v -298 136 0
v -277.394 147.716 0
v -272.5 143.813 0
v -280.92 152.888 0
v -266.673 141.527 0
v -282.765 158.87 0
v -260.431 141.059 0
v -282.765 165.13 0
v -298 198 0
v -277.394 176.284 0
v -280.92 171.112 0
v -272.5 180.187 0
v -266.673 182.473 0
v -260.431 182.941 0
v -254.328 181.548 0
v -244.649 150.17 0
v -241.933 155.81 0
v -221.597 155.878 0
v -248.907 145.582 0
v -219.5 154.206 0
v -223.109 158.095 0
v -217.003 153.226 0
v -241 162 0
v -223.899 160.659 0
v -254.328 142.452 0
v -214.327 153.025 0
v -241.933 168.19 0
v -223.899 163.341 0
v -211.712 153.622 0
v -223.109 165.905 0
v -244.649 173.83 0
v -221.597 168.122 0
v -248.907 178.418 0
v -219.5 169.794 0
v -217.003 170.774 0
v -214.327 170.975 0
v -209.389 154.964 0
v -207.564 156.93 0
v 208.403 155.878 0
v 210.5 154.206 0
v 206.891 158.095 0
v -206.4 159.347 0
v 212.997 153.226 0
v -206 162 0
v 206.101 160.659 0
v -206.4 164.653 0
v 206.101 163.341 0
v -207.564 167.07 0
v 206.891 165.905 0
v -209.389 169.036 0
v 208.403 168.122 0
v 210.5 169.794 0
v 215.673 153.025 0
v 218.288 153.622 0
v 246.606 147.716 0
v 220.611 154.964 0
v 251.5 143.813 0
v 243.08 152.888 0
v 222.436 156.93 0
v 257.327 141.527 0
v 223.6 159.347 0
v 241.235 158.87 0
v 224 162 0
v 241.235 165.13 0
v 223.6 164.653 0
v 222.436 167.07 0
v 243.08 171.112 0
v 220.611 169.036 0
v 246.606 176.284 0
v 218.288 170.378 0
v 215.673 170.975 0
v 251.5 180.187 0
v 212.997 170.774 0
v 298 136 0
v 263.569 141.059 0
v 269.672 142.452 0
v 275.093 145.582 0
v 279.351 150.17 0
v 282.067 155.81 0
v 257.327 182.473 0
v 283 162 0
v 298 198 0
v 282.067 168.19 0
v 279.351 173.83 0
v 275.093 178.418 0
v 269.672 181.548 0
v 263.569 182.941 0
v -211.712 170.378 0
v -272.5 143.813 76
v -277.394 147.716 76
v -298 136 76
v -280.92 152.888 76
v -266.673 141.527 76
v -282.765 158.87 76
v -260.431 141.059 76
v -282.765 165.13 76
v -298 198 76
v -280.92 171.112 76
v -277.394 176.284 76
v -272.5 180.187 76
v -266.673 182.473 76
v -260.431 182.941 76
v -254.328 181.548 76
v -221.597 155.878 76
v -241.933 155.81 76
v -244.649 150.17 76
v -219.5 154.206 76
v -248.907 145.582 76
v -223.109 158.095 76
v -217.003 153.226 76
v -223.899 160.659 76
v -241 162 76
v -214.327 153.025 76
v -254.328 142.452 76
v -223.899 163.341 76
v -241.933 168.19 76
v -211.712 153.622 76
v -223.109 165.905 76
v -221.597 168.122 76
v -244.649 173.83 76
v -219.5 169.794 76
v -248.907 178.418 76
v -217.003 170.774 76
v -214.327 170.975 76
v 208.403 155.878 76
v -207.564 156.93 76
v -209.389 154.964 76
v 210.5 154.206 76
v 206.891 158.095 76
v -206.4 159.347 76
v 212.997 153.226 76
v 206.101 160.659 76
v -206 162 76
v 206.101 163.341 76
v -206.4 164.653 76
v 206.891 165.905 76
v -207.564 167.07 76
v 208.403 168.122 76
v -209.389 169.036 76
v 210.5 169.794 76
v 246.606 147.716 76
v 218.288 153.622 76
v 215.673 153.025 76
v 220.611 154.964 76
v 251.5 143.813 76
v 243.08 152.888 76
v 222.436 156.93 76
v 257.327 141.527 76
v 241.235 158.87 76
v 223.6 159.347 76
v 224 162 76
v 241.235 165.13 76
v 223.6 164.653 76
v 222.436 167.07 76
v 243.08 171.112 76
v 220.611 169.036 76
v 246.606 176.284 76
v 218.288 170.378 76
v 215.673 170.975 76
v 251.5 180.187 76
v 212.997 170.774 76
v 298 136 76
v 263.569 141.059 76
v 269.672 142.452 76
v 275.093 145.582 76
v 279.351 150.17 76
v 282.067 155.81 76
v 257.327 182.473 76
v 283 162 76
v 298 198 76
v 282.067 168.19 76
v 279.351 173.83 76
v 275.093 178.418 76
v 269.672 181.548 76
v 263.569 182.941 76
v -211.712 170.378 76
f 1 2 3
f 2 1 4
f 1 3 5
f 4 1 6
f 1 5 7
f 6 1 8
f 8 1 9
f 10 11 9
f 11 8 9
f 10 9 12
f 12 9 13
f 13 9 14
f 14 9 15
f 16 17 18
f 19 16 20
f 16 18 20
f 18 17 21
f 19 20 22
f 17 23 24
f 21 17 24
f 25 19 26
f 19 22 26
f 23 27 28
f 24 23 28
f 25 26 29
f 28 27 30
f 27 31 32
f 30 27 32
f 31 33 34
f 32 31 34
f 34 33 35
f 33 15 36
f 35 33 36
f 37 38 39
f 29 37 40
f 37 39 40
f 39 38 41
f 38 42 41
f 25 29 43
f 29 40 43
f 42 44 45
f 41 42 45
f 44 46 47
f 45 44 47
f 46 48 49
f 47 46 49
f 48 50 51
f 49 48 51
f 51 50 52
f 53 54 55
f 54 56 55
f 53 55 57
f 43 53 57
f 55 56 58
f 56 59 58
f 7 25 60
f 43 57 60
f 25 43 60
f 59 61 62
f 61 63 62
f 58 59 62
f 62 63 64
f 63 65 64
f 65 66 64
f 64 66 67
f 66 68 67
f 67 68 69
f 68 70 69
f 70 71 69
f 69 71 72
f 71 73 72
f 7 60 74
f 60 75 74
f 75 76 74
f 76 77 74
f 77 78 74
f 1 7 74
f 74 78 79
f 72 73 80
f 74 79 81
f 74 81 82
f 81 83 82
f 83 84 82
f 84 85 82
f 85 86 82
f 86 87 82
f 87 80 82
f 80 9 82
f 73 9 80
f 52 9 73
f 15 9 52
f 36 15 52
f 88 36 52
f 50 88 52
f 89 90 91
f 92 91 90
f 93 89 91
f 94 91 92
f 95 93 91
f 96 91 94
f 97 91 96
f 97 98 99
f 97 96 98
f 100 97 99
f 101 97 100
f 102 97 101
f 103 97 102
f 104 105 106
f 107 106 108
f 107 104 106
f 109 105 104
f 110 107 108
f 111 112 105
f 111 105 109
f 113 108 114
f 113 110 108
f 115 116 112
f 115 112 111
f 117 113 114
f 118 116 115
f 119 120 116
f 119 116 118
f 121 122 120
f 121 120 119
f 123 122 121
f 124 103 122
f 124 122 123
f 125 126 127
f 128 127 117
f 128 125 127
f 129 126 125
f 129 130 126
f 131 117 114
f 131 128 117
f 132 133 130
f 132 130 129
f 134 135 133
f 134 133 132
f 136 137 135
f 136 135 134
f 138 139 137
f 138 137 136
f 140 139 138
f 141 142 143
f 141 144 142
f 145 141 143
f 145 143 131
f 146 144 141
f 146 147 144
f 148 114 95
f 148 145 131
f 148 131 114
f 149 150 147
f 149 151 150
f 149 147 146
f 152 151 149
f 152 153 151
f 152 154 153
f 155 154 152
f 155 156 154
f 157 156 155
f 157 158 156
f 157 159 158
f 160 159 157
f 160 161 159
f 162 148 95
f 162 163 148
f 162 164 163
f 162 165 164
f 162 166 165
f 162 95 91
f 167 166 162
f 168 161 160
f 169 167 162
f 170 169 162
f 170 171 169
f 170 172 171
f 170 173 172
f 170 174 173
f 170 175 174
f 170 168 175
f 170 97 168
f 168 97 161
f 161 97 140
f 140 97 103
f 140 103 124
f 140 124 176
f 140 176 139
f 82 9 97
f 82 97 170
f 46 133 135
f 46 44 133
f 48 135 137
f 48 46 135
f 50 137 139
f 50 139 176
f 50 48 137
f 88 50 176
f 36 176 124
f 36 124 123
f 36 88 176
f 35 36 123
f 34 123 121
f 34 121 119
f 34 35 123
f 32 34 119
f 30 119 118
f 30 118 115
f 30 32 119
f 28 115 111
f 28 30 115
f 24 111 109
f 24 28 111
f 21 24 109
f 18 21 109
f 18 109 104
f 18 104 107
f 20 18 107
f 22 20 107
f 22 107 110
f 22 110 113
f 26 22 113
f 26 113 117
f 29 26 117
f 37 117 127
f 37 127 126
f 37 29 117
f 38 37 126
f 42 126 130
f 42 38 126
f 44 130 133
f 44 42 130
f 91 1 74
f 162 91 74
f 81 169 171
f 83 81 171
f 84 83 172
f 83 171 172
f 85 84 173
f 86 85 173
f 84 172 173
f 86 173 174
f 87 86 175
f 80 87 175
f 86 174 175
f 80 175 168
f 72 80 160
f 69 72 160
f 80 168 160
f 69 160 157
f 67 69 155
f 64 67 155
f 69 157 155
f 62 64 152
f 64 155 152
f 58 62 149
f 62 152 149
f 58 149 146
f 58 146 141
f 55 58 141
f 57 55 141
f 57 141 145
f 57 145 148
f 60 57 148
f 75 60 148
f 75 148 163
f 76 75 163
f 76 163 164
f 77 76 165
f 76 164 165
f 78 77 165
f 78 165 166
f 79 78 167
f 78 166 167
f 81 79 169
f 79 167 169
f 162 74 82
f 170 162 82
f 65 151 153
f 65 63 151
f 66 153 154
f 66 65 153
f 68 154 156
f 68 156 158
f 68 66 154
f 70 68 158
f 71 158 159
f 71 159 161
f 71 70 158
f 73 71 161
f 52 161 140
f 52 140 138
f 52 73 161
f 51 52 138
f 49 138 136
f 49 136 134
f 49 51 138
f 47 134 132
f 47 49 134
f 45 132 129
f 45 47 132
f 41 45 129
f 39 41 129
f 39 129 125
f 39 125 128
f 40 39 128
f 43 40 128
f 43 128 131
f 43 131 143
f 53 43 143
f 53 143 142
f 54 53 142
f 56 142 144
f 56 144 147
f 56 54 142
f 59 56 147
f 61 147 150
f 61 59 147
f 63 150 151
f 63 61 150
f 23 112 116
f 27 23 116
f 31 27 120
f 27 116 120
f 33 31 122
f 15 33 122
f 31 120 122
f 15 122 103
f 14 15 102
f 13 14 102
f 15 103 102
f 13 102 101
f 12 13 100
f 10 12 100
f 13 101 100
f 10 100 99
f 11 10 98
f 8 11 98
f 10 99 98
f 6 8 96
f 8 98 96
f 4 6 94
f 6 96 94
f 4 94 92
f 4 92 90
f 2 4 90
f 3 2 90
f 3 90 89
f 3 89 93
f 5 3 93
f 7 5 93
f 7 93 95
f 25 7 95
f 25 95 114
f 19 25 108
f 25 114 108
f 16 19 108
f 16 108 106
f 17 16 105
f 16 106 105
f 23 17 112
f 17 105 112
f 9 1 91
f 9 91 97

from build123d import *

# Parameters (mm, degrees)
SZKIC1_W                    = 596
SZKIC1_H                    = 62
DODANIE_WYCI_GNI_CIE1_DEPTH = 76
SZKIC2_R                    = 21
WYTNIJ_WYCI_GNI_CIE1_DEPTH  = 76
SZKIC3_R                    = 21
WYTNIJ_WYCI_GNI_CIE2_DEPTH  = 76
SZKIC4_W                    = 76
SZKIC4_H                    = 9
SZKIC5_W                    = 76
SZKIC5_H                    = 9


with BuildPart() as part:
    # Szkic1 → Dodanie-wyciągnięcie1 (new body)
    with BuildSketch(Plane.XY):
        with Locations((0, 167)):
            Rectangle(SZKIC1_W, SZKIC1_H)
    extrude(amount=DODANIE_WYCI_GNI_CIE1_DEPTH)

    # Szkic2 → Wytnij-wyciągnięcie1 (cut)
    with BuildSketch(Plane.XY.offset(76)):
        with Locations((262, 162)):
            Circle(SZKIC2_R)
    extrude(amount=-WYTNIJ_WYCI_GNI_CIE1_DEPTH, mode=Mode.SUBTRACT)

    # Szkic3 → Wytnij-wyciągnięcie2 (cut)
    with BuildSketch(Plane.XY.offset(76)):
        with Locations((-262, 162)):
            Circle(SZKIC3_R)
    extrude(amount=-WYTNIJ_WYCI_GNI_CIE2_DEPTH, mode=Mode.SUBTRACT)

    # Szkic4 → Wycięcie-obrót1 (revolve, cut)
    with BuildSketch(Plane(origin=(215, 0, 0), x_dir=(0, 0, -1), z_dir=(1, 0, 0))):
        with Locations((-38, 166.5)):
            Rectangle(SZKIC4_W, SZKIC4_H)
    revolve(axis=Axis((215, 162, 0), (0, 0, 1)), mode=Mode.SUBTRACT)

    # Szkic5 → Wycięcie-obrót2 (revolve, cut)
    with BuildSketch(Plane(origin=(-215, 0, 0), x_dir=(0, 0, -1), z_dir=(1, 0, 0))):
        with Locations((-38, 166.5)):
            Rectangle(SZKIC5_W, SZKIC5_H)
    revolve(axis=Axis((-215, 162, 0), (0, 0, 1)), mode=Mode.SUBTRACT)


solid = part.part
